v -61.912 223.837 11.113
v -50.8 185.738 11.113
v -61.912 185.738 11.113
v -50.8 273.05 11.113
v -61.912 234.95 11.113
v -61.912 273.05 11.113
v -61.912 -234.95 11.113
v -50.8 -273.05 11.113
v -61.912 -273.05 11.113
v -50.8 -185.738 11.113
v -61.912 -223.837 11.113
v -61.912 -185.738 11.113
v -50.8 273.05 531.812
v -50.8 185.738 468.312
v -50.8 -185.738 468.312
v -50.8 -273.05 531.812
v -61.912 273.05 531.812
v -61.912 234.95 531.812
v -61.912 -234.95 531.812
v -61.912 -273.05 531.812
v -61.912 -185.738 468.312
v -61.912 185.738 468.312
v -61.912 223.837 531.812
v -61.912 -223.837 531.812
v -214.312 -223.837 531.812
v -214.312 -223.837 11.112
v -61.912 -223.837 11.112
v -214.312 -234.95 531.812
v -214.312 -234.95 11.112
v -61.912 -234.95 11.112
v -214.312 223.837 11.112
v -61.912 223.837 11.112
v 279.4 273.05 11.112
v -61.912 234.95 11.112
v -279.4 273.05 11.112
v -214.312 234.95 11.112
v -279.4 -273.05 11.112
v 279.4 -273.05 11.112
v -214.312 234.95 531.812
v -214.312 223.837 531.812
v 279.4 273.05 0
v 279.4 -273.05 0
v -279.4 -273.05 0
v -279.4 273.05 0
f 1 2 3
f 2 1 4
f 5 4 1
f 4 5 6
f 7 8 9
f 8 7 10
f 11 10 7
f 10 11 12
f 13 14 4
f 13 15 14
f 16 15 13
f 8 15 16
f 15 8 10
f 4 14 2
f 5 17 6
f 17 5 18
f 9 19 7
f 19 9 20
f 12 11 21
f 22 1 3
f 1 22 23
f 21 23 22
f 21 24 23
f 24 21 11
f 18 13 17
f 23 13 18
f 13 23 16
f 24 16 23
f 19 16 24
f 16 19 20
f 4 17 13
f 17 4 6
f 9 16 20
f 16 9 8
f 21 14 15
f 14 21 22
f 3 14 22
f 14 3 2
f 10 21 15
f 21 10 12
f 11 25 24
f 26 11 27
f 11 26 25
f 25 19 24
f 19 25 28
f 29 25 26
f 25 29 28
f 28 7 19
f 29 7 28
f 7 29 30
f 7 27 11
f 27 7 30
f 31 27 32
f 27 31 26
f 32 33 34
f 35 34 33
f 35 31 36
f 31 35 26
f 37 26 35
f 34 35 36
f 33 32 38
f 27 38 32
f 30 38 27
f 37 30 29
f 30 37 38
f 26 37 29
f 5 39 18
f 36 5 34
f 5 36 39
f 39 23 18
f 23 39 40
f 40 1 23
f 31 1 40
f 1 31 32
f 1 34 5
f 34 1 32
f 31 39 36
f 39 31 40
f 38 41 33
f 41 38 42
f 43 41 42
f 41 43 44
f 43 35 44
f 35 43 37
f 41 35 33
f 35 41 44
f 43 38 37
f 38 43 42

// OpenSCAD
include <MCAD/units.scad>

osb_thickness = 7/16 * inch;

base_width = 21.5 * inch;
base_length = 22 * inch;
base_thickness = osb_thickness;

arch_width = 21.5 * inch;
arch_length = 20.5 * inch;
arch_thickness = osb_thickness;

arch_opening_width =  14.625 * inch;
arch_opening_height = 18 * inch;

wing_width = 6 * inch;
wing_length = 20.5 * inch;
wing_thickness = osb_thickness;

space_in_front = 13 * inch;

wing_inset = 1.5 * inch;


arch_setback = base_length/2 - arch_thickness - space_in_front;
wing_setback = arch_setback - (wing_width/2);




echo("Max Arch Opening", (base_width - (wing_inset*4) - (wing_thickness*2)   ) / inch);

module base() {
	translate([0,0,base_thickness/2])
		cube([base_length, base_width, base_thickness], center = true);
} 

module arch() {

    fudge = 1;
	translate([0,0,base_thickness/2])
		difference() {
			cube([arch_length, arch_width, arch_thickness], center = true);
			translate([(arch_length - arch_opening_height) / 2,0,0])
				cube([arch_opening_height, arch_opening_width, arch_thickness + fudge], center = true);
		}
}

module wing() {

	translate([0,0,base_thickness/2])
		cube([wing_length, wing_width, wing_thickness], center = true);
}

translate([arch_setback,0,(arch_length/2) + base_thickness])
	rotate([0,90,0])
		arch();
		
for (side = [-1,1])
translate([wing_setback, (base_width/2 - wing_thickness/2 - wing_inset )*side +  -wing_thickness/2 ,(arch_length/2) + base_thickness])
	rotate([0,90,90])
		wing();
		
base();
